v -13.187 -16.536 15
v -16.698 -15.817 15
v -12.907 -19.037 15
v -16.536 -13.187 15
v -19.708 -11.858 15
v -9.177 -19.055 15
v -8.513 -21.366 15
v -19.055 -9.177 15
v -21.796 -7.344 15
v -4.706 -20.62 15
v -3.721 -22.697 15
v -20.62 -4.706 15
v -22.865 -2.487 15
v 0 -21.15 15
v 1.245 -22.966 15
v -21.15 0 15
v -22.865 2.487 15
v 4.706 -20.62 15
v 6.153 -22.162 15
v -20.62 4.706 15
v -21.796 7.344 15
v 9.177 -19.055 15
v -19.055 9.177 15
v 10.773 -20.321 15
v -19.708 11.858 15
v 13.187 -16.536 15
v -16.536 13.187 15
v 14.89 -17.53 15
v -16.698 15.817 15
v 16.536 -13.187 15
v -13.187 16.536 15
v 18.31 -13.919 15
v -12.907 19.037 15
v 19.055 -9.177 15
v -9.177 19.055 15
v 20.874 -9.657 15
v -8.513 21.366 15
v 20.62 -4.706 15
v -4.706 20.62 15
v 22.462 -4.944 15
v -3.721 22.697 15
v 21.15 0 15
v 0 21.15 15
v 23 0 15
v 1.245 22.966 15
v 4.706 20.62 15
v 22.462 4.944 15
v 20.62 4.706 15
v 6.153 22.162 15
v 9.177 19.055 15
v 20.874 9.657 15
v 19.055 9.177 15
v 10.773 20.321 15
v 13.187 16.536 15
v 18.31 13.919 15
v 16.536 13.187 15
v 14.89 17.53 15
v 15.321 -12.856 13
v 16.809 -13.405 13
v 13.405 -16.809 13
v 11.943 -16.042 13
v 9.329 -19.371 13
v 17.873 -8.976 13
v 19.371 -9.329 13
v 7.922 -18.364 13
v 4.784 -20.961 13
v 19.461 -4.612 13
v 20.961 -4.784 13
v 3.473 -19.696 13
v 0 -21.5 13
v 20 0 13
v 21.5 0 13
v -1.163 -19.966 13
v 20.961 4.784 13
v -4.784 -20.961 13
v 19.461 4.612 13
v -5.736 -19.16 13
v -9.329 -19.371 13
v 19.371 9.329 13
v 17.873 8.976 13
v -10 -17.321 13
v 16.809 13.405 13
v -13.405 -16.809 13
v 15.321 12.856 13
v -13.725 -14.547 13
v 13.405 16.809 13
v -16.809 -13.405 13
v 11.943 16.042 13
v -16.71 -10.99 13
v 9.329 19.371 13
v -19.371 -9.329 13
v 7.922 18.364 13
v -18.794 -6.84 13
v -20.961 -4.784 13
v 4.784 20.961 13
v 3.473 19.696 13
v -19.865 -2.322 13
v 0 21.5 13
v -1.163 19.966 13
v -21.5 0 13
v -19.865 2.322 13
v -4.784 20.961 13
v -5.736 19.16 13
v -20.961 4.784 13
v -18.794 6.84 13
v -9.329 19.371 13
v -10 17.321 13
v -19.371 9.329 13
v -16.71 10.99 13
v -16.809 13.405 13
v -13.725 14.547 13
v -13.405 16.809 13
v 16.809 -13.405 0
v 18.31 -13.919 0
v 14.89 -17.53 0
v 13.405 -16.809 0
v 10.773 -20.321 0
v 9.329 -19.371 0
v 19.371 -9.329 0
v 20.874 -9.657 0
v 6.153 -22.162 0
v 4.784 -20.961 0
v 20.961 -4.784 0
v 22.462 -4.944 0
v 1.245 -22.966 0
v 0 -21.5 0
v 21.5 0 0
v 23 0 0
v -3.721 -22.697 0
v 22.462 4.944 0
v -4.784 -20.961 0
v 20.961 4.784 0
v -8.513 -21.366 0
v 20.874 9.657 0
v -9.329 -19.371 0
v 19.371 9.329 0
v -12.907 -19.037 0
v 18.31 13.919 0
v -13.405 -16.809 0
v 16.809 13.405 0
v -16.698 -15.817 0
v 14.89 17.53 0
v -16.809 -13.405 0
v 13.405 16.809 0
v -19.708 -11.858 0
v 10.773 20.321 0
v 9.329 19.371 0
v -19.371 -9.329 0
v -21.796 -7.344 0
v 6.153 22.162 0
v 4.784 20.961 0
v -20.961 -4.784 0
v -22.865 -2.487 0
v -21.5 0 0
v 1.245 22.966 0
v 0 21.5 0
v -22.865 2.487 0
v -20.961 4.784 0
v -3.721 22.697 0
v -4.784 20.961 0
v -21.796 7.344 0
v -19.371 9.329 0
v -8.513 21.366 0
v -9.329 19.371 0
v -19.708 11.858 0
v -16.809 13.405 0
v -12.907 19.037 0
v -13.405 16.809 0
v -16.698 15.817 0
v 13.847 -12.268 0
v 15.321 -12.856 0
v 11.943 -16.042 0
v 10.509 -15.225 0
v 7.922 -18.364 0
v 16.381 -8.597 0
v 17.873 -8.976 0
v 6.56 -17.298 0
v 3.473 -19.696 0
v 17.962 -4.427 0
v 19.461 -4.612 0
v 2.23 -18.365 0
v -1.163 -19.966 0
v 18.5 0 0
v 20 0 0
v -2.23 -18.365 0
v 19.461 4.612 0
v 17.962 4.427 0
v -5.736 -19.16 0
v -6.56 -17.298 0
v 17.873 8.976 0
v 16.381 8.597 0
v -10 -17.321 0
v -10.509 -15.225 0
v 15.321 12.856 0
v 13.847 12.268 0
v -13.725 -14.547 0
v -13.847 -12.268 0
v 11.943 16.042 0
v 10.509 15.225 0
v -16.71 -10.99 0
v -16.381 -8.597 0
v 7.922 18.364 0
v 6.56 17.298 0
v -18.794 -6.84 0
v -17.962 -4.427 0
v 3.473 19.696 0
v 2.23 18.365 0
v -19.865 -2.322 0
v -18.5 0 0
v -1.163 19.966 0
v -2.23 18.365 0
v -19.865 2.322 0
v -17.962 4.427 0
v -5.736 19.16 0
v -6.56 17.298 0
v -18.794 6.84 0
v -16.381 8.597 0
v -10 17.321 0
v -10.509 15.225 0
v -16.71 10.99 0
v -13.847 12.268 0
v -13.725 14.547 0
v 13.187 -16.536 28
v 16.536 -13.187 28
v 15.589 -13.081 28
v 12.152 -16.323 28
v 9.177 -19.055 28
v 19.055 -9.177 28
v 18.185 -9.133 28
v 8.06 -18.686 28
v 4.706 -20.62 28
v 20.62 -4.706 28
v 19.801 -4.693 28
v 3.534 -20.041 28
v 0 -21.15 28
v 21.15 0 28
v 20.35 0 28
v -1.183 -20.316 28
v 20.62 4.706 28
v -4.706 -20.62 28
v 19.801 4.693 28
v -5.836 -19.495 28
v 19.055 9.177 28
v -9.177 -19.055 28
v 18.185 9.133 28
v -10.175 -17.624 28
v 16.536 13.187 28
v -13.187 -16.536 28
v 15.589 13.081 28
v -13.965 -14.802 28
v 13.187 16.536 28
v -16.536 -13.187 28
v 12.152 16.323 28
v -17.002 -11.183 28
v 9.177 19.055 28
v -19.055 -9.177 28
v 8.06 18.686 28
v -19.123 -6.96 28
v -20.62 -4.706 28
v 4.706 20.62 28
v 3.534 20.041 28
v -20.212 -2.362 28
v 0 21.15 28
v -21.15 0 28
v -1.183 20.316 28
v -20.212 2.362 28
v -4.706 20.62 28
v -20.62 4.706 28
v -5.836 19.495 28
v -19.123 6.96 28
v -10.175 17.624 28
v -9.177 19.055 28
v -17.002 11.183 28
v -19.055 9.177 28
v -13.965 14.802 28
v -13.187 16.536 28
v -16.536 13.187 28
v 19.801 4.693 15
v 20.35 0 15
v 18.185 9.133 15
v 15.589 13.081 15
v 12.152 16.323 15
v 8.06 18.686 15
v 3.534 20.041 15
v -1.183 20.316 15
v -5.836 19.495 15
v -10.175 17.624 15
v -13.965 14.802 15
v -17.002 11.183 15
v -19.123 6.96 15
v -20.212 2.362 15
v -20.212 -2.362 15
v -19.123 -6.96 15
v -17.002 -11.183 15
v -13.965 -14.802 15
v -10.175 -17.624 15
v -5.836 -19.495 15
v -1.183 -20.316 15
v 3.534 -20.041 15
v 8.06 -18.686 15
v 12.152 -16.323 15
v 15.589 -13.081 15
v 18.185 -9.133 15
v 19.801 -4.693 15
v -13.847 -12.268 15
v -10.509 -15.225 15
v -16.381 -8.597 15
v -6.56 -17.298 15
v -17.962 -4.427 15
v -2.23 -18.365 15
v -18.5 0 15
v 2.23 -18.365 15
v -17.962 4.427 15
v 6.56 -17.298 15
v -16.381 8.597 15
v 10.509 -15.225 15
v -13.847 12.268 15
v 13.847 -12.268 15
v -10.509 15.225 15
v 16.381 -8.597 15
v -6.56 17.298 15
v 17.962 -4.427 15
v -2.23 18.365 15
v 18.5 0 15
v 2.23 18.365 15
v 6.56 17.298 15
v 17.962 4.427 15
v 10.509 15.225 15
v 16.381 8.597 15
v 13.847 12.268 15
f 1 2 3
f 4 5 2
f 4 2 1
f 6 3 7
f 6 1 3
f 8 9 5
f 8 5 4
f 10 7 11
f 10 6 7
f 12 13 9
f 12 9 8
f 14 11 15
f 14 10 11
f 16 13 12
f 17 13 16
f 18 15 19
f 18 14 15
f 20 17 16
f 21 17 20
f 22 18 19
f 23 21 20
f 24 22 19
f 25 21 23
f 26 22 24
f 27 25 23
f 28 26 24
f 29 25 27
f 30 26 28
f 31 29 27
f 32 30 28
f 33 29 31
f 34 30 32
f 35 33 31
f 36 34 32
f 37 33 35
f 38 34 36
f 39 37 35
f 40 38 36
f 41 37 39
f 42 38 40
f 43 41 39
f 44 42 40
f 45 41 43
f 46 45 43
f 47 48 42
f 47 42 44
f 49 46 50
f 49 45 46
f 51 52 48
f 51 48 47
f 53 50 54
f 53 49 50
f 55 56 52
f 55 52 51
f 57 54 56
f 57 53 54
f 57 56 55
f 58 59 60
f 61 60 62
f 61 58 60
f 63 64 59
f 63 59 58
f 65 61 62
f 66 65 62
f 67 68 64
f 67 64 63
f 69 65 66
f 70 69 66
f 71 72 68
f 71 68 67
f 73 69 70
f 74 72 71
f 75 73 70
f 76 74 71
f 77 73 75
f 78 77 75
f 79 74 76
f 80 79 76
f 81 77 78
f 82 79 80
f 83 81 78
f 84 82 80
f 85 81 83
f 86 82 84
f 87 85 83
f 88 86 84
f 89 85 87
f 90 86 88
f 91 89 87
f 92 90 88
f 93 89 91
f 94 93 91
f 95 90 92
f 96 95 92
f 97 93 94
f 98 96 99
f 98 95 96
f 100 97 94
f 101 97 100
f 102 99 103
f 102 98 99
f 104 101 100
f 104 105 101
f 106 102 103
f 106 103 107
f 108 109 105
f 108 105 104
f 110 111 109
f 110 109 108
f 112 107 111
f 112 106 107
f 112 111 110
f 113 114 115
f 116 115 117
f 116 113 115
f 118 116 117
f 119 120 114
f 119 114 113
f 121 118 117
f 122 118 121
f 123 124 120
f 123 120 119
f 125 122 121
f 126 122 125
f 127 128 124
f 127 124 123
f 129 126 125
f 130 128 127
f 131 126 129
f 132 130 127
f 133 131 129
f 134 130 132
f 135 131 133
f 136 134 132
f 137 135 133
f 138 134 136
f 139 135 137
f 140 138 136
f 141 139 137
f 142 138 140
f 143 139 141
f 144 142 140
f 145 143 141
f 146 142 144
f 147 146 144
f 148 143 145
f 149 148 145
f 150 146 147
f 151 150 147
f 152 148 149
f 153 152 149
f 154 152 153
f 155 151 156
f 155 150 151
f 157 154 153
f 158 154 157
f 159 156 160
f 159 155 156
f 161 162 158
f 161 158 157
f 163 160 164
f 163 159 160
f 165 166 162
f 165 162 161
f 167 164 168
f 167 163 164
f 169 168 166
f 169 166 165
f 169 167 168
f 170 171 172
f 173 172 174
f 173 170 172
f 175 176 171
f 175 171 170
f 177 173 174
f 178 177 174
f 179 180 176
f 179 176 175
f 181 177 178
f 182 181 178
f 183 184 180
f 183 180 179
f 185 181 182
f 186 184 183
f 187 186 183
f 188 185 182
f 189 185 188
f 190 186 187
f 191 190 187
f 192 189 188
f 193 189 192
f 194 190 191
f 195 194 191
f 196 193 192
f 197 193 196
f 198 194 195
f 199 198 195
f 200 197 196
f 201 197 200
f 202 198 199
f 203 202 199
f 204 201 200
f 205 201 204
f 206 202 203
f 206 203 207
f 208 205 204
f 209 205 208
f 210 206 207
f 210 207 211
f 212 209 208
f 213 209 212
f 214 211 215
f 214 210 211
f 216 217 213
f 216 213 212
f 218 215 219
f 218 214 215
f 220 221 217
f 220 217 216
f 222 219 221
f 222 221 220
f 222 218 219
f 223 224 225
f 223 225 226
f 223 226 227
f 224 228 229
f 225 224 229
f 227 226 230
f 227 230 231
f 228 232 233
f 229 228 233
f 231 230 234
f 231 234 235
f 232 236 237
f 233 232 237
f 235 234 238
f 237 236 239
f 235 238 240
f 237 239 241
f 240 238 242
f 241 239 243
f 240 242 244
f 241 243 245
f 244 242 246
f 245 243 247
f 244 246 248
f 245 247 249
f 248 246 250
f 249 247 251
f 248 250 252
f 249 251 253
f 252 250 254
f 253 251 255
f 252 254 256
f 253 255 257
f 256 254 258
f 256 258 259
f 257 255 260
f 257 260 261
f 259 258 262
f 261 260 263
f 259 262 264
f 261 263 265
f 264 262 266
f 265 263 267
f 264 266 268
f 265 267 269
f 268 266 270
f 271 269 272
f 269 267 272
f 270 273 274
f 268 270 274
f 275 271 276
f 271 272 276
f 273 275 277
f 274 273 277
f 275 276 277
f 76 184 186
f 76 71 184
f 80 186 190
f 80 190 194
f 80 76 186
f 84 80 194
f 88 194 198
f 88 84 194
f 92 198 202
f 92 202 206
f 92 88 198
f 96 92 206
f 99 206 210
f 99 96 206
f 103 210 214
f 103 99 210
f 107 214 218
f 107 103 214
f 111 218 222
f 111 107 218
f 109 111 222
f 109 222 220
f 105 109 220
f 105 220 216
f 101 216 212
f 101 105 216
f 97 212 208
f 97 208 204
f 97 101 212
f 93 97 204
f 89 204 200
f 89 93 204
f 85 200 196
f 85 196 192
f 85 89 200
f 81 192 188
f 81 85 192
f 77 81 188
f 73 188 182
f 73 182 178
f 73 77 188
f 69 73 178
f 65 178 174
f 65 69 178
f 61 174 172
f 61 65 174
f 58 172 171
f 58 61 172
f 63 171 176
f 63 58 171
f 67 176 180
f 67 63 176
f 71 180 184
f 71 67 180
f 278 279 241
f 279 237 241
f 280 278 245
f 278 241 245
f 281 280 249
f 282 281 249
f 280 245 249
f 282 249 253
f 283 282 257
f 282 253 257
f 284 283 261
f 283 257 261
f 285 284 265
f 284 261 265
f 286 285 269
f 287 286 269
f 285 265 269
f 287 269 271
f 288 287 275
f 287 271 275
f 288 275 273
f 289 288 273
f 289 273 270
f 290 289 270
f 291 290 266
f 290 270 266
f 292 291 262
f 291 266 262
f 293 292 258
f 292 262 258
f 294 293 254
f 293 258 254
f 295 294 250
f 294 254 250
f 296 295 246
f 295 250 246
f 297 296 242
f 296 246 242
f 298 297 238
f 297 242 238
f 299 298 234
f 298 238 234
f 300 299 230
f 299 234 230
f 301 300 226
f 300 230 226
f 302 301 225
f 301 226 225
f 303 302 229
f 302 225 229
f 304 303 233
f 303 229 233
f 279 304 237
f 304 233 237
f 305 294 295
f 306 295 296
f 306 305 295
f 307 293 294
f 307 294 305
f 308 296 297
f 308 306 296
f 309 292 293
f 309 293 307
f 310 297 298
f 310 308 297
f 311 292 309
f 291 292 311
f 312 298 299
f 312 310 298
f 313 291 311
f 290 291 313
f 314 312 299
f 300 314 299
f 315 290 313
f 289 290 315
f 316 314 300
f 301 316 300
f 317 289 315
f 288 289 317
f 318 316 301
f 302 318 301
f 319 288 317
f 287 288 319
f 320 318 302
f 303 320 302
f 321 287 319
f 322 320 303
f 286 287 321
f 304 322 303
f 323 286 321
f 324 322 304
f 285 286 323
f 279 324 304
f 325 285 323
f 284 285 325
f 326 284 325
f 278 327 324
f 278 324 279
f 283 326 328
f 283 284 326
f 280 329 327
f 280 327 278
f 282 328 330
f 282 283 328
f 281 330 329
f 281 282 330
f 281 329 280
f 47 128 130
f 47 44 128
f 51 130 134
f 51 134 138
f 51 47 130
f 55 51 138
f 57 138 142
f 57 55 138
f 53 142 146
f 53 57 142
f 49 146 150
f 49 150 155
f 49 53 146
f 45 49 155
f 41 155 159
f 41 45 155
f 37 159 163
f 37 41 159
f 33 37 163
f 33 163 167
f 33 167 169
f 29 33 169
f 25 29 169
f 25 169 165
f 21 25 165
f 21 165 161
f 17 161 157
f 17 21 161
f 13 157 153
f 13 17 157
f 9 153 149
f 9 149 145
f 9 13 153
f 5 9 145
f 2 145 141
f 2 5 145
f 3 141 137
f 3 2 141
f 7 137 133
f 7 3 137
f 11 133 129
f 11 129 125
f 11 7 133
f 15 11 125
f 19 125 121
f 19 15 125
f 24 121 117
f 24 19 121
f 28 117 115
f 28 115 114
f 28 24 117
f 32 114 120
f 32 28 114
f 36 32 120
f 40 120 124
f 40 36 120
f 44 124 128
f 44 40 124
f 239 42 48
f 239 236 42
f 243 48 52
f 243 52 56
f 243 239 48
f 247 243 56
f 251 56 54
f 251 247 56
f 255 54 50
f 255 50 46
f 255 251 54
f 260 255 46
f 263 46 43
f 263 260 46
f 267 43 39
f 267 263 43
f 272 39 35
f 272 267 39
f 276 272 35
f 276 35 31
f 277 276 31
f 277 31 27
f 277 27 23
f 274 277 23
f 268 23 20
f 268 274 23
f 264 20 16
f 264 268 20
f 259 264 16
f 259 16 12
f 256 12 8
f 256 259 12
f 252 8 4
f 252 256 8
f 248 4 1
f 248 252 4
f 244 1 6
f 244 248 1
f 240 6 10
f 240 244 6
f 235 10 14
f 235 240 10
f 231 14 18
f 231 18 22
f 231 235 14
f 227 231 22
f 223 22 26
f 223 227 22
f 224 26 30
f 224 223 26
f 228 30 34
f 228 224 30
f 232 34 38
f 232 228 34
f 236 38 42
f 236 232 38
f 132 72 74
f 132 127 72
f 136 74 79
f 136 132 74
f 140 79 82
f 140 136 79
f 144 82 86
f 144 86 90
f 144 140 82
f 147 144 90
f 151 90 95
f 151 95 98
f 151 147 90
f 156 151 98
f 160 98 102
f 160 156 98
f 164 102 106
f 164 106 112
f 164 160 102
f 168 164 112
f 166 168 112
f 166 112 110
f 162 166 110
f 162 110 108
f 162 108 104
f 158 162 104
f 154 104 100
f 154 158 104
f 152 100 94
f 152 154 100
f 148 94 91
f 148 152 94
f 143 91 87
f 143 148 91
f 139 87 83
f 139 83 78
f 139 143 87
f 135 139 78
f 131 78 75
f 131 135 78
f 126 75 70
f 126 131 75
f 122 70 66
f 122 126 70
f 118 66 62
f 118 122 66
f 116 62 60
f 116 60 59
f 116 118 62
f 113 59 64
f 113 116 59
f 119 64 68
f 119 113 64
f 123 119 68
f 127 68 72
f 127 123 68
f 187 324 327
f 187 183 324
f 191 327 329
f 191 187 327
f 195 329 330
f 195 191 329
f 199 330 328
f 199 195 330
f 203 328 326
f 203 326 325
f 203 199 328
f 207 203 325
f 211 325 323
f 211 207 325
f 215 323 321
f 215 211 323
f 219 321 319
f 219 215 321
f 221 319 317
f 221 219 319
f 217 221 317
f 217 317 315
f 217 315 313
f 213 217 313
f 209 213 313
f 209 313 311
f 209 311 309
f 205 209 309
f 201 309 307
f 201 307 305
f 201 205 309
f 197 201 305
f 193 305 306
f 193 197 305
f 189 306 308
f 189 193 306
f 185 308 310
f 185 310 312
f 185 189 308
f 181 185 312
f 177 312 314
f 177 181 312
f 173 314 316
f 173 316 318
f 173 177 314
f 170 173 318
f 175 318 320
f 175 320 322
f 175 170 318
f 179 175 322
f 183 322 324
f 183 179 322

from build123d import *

# Parameters (mm, degrees)
F0_W   = 1.5
F0_H   = 13
F0_H_2 = 2
F0_W_2 = 0.8


with BuildPart() as f1:
    # F0 (on Front) → F1 (revolve)
    with BuildSketch(Plane.XZ):
        with Locations((19.25, 6.5)):
            Rectangle(F0_W, F0_H)
        with Locations((22.25, 6.5)):
            Rectangle(F0_W, F0_H)
        with Locations((22.25, 14)):
            Rectangle(F0_W, F0_H_2)
        Polygon((20, 15), (20, 13), (21.5, 13), (21.5, 15), (21.15, 15), (20.35, 15), align=None)
        with Locations((19.25, 14)):
            Rectangle(F0_W, F0_H_2)
        with Locations((20.75, 21.5)):
            Rectangle(F0_W_2, F0_H)
    revolve(axis=Axis((0, 0, 7.5), (0, 0, 1)))


solid = f1.part
